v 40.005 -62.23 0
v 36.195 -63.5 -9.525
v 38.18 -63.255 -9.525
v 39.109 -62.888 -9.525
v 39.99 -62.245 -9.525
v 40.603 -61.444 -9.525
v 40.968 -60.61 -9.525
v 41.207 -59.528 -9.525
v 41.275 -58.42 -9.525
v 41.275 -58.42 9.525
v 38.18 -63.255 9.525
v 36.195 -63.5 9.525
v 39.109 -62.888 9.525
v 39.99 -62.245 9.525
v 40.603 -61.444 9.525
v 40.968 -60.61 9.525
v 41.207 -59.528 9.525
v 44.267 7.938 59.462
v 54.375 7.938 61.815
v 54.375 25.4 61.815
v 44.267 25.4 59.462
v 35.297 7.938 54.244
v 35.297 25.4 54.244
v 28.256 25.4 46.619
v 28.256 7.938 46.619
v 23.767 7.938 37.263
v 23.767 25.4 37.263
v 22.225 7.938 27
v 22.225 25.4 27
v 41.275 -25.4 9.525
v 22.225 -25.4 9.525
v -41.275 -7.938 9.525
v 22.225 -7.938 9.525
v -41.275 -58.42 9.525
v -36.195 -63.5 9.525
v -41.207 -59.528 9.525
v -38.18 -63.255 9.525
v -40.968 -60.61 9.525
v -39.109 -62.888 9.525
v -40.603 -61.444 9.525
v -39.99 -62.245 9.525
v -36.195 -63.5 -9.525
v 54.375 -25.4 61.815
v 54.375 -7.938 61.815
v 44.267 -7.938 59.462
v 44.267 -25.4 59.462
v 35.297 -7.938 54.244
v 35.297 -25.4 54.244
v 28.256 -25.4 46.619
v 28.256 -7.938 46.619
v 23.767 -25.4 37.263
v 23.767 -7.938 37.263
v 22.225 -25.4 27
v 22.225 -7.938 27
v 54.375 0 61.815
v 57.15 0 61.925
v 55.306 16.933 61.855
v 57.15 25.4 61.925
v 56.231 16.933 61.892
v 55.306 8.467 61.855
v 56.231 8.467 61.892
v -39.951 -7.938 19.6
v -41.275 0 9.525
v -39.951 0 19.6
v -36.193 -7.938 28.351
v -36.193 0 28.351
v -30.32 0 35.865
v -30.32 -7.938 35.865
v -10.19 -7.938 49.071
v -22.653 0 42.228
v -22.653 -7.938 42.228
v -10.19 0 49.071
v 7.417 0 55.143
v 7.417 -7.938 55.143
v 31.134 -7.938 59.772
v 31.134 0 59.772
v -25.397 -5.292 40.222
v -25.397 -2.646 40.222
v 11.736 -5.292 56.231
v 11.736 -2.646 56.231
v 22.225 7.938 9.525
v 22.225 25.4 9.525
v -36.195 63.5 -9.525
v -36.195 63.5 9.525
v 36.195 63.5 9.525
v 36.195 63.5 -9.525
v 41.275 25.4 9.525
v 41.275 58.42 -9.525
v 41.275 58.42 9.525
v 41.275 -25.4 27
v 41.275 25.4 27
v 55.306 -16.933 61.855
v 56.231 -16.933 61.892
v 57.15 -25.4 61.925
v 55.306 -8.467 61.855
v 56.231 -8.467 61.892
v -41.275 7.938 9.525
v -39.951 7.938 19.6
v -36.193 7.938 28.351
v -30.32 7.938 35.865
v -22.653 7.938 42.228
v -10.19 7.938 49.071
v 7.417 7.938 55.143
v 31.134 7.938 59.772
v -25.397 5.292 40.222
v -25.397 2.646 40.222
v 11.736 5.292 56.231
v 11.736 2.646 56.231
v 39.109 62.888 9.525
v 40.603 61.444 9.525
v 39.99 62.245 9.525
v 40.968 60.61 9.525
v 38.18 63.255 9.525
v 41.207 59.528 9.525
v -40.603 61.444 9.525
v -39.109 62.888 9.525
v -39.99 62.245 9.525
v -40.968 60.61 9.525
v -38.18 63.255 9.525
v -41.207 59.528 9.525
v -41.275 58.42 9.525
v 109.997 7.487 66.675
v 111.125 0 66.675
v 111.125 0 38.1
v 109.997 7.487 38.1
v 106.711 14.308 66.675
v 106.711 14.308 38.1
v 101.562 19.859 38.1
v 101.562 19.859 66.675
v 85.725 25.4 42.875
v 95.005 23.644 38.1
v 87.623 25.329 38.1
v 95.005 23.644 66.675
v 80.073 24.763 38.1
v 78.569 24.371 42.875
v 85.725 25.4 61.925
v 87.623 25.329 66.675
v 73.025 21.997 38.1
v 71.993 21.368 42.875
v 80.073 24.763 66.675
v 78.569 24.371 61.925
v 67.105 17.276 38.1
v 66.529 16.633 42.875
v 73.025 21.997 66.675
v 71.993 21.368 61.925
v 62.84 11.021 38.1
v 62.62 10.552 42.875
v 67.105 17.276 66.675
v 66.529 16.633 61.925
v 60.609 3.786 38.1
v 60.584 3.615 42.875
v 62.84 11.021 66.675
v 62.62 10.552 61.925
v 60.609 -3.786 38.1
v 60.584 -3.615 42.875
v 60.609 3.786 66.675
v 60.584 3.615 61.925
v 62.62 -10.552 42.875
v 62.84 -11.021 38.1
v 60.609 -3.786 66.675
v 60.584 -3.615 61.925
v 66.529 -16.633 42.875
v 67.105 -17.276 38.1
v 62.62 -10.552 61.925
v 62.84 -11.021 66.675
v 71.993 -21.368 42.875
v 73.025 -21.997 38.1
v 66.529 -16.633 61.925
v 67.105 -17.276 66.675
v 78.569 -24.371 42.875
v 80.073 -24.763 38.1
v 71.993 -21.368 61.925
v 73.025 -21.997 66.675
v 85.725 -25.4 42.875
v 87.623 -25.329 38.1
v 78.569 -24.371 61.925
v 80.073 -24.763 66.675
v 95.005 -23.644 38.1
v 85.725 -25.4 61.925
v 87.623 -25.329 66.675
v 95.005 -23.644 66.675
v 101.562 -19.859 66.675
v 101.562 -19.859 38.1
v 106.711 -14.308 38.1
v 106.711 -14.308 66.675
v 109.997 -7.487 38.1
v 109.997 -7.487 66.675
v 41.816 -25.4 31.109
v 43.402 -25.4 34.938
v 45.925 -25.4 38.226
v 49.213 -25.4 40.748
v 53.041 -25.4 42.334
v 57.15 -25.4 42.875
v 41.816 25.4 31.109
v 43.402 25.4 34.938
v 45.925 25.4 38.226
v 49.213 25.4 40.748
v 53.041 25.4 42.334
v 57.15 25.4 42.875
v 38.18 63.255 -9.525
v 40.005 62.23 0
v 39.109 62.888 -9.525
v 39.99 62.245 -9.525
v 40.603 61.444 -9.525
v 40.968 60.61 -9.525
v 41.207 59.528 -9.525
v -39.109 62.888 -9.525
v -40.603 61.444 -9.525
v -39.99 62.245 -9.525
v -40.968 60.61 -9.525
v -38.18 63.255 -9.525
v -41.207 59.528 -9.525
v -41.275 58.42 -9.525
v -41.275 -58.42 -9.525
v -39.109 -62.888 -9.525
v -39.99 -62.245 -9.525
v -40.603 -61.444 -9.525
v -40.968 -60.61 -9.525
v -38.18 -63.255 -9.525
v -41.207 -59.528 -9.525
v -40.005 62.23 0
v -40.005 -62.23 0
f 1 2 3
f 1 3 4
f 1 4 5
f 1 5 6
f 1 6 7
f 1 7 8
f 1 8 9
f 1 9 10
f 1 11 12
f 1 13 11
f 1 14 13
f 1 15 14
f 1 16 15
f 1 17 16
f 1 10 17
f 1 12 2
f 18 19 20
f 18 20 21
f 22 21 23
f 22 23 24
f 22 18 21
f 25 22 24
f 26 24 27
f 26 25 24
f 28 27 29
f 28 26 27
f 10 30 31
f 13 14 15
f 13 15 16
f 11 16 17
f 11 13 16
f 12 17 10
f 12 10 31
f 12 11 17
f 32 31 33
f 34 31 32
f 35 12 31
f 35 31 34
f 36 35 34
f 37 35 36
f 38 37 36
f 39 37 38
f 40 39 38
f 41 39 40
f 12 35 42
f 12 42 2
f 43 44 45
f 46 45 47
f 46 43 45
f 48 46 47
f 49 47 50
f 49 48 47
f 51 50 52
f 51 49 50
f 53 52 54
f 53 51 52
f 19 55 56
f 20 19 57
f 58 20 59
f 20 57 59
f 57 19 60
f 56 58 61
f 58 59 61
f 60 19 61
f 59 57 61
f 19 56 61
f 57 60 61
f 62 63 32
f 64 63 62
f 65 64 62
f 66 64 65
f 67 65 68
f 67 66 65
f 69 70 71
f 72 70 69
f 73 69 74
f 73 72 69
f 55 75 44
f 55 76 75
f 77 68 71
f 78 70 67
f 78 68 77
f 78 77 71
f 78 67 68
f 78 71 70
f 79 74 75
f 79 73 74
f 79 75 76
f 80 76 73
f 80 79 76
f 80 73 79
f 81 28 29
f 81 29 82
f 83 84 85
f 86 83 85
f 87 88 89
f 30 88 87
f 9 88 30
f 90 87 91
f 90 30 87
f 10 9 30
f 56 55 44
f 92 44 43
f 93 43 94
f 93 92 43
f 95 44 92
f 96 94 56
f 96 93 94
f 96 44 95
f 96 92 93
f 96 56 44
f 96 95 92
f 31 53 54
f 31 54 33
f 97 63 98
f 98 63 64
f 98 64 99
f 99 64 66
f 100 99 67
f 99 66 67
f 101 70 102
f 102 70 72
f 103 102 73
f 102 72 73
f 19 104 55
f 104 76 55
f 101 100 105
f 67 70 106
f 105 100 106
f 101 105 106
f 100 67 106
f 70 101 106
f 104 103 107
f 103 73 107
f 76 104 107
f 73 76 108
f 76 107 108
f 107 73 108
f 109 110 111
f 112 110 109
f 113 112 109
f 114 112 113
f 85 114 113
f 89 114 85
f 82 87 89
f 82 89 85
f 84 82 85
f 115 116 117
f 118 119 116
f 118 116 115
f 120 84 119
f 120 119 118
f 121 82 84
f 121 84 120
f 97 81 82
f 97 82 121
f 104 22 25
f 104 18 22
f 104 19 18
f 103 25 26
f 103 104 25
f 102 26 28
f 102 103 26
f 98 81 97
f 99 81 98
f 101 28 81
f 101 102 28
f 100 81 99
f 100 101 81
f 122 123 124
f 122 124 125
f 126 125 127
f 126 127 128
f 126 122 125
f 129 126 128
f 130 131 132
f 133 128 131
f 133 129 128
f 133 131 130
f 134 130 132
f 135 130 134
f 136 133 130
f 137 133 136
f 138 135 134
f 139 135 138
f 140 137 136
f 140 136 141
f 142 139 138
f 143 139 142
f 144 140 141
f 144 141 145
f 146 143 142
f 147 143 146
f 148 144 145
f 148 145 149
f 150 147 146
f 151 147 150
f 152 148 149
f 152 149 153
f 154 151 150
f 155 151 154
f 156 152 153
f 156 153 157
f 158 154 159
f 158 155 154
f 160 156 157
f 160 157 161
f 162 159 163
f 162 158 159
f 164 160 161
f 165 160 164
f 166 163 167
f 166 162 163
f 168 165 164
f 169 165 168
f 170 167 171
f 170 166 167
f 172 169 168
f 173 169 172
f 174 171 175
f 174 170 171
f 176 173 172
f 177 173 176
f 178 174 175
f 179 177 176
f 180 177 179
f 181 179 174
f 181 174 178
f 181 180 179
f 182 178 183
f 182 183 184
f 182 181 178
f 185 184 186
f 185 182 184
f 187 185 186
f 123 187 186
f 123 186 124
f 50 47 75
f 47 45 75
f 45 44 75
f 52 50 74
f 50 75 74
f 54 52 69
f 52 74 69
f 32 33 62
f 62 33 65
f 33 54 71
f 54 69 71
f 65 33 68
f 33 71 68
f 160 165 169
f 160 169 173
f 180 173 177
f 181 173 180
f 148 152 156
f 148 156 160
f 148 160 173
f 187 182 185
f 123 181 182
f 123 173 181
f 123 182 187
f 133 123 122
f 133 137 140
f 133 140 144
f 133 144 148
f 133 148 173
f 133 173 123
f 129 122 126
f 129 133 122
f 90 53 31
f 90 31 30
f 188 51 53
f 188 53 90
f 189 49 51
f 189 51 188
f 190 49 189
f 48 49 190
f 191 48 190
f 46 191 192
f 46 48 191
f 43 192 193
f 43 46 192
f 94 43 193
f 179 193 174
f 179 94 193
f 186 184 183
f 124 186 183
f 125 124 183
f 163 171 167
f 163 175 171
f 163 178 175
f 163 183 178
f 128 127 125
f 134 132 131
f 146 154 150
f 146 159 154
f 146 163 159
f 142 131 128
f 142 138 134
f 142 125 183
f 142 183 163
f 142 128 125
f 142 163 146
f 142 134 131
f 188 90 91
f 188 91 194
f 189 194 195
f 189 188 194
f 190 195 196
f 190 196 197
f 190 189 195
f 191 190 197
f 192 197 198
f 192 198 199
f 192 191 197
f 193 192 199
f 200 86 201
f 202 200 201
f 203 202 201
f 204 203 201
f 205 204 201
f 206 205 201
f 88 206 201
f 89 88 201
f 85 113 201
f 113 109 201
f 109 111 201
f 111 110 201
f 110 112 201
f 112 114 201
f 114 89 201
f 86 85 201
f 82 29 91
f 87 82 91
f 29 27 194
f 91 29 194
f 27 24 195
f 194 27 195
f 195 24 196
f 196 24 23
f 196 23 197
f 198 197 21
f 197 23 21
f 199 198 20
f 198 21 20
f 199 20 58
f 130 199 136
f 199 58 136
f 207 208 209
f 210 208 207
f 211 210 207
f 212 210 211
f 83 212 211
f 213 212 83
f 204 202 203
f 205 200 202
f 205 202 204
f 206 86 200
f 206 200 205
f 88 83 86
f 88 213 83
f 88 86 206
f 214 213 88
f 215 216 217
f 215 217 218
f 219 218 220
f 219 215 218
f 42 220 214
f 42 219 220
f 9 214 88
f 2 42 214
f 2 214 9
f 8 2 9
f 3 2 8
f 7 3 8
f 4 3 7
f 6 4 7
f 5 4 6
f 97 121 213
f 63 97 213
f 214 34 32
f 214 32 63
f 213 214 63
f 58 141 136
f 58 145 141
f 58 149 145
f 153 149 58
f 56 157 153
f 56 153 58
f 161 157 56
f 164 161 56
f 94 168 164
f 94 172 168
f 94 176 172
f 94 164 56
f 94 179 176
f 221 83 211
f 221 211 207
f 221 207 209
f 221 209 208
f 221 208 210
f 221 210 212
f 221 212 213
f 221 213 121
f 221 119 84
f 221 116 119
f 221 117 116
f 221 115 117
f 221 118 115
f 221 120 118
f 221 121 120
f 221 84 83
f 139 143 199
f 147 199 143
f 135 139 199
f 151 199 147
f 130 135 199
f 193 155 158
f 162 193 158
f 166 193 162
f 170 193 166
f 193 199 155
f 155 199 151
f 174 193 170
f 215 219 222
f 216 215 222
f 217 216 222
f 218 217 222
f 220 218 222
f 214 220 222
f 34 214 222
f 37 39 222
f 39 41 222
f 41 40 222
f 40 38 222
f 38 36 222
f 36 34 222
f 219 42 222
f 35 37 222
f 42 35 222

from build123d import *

# Parameters (mm, degrees)
F1_DEPTH    = 63.5
F0_W        = 25.4
F0_H        = 19.05
F2_DEPTH    = 25.4
F3_DEPTH    = 7.9375
F5_T1_DEPTH = 44.45


# Not quite as in the source:
# - a fillet or chamfer that OpenCascade refuses, or shapes differently, is made with other operations: its cross-section is extruded or revolved along the edge and cut away or added


with BuildPart() as f1:
    # F0 (on Front) → F1 (new body, symmetric)
    with BuildSketch(Plane.XZ):
        Polygon((22.225, 9.525), (-41.275, 9.525), (-41.275, -9.525), (41.275, -9.525), (41.275, 9.525), align=None)
    extrude(amount=F1_DEPTH, both=True)

    # F0 (on Front) → F2 (join, symmetric)
    with BuildSketch(Plane.XZ):
        with BuildLine():
            Line((22.225, 27.0002), (22.225, 9.525))
            Line((22.225, 9.525), (41.275, 9.525))
            Line((41.275, 9.525), (41.275, 27.0002))
            ThreePointArc((41.275, 27.0002), (45.9246798487, 38.2255201513), (57.15, 42.8752))
            Line((57.15, 42.8752), (60.325, 42.8752))
            Line((60.325, 42.8752), (60.325, 61.9252))
            Line((60.325, 61.9252), (57.15, 61.9252))
            add(Edge.make_bspline(
                [(54.3750515166, 61.8147843852), (55.3086427557, 61.8565061807), (56.2339227715, 61.893230908), (57.15, 61.9252)],
                knots=[108.9702028018, 108.9702028018, 108.9702028018, 108.9702028018, 111.5045361635, 111.5045361635, 111.5045361635, 111.5045361635], degree=3))
            ThreePointArc((54.3750515166, 61.8147843852), (31.4919534962, 50.6945089076), (22.225, 27.0002))
        make_face()
        with Locations((73.025, 52.4002)):
            Rectangle(F0_W, F0_H)
    extrude(amount=F2_DEPTH, both=True)

    # F0 (on Front) → F3 (join, symmetric)
    with BuildSketch(Plane.XZ):
        with BuildLine():
            add(Edge.make_bspline(
                [(-41.275, 9.525), (-41.275, 48.9883726548), (14.232887036, 60.0208481258), (54.3750515166, 61.8147843852)],
                knots=[0, 0, 0, 0, 108.9702028018, 108.9702028018, 108.9702028018, 108.9702028018], degree=3))
            Line((-41.275, 9.525), (22.225, 9.525))
            Line((22.225, 9.525), (22.225, 27.0002))
            ThreePointArc((22.225, 27.0002), (31.4919534962, 50.6945089076), (54.3750515166, 61.8147843852))
        make_face()
    extrude(amount=F3_DEPTH, both=True)

    # F0 (on Front) → F4 (revolve)
    with BuildSketch(Plane.XZ):
        Polygon((85.725, 66.675), (85.725, 61.9252), (85.725, 42.8752), (85.725, 38.1), (111.125, 38.1), (111.125, 66.675), align=None)
    revolve(axis=Axis((85.725, 0, 52.3875), (0, 0, 1)))

    # F5: fillet of radius 5.08 on 4 edges, made by hand

    # F5_s2 → F5_t1 (cut)
    with BuildSketch(Plane.XY.offset(-22.225)):
        with BuildLine():
            add(Edge.make_bspline(
                [(41.275, -58.42), (41.275, -63.5), (36.195, -63.5)],
                knots=[0, 0, 0, 1, 1, 1], degree=2, weights=[1, 1, 1]))
            Line((36.195, -63.5), (41.275, -63.5))
            Line((41.275, -63.5), (41.275, -58.42))
        make_face()
        with BuildLine():
            add(Edge.make_bspline(
                [(-41.275, -58.42), (-41.275, -63.5), (-36.195, -63.5)],
                knots=[0, 0, 0, 1, 1, 1], degree=2, weights=[1, 1, 1]))
            Line((-36.195, -63.5), (-41.275, -63.5))
            Line((-41.275, -63.5), (-41.275, -58.42))
        make_face()
        with BuildLine():
            add(Edge.make_bspline(
                [(41.275, 58.42), (41.275, 63.5), (36.195, 63.5)],
                knots=[0, 0, 0, 1, 1, 1], degree=2, weights=[1, 1, 1]))
            Line((36.195, 63.5), (41.275, 63.5))
            Line((41.275, 63.5), (41.275, 58.42))
        make_face()
        with BuildLine():
            add(Edge.make_bspline(
                [(-41.275, 58.42), (-41.275, 63.5), (-36.195, 63.5)],
                knots=[0, 0, 0, 1, 1, 1], degree=2, weights=[1, 1, 1]))
            Line((-36.195, 63.5), (-41.275, 63.5))
            Line((-41.275, 63.5), (-41.275, 58.42))
        make_face()
    extrude(amount=F5_T1_DEPTH, mode=Mode.SUBTRACT)


solid = f1.part
